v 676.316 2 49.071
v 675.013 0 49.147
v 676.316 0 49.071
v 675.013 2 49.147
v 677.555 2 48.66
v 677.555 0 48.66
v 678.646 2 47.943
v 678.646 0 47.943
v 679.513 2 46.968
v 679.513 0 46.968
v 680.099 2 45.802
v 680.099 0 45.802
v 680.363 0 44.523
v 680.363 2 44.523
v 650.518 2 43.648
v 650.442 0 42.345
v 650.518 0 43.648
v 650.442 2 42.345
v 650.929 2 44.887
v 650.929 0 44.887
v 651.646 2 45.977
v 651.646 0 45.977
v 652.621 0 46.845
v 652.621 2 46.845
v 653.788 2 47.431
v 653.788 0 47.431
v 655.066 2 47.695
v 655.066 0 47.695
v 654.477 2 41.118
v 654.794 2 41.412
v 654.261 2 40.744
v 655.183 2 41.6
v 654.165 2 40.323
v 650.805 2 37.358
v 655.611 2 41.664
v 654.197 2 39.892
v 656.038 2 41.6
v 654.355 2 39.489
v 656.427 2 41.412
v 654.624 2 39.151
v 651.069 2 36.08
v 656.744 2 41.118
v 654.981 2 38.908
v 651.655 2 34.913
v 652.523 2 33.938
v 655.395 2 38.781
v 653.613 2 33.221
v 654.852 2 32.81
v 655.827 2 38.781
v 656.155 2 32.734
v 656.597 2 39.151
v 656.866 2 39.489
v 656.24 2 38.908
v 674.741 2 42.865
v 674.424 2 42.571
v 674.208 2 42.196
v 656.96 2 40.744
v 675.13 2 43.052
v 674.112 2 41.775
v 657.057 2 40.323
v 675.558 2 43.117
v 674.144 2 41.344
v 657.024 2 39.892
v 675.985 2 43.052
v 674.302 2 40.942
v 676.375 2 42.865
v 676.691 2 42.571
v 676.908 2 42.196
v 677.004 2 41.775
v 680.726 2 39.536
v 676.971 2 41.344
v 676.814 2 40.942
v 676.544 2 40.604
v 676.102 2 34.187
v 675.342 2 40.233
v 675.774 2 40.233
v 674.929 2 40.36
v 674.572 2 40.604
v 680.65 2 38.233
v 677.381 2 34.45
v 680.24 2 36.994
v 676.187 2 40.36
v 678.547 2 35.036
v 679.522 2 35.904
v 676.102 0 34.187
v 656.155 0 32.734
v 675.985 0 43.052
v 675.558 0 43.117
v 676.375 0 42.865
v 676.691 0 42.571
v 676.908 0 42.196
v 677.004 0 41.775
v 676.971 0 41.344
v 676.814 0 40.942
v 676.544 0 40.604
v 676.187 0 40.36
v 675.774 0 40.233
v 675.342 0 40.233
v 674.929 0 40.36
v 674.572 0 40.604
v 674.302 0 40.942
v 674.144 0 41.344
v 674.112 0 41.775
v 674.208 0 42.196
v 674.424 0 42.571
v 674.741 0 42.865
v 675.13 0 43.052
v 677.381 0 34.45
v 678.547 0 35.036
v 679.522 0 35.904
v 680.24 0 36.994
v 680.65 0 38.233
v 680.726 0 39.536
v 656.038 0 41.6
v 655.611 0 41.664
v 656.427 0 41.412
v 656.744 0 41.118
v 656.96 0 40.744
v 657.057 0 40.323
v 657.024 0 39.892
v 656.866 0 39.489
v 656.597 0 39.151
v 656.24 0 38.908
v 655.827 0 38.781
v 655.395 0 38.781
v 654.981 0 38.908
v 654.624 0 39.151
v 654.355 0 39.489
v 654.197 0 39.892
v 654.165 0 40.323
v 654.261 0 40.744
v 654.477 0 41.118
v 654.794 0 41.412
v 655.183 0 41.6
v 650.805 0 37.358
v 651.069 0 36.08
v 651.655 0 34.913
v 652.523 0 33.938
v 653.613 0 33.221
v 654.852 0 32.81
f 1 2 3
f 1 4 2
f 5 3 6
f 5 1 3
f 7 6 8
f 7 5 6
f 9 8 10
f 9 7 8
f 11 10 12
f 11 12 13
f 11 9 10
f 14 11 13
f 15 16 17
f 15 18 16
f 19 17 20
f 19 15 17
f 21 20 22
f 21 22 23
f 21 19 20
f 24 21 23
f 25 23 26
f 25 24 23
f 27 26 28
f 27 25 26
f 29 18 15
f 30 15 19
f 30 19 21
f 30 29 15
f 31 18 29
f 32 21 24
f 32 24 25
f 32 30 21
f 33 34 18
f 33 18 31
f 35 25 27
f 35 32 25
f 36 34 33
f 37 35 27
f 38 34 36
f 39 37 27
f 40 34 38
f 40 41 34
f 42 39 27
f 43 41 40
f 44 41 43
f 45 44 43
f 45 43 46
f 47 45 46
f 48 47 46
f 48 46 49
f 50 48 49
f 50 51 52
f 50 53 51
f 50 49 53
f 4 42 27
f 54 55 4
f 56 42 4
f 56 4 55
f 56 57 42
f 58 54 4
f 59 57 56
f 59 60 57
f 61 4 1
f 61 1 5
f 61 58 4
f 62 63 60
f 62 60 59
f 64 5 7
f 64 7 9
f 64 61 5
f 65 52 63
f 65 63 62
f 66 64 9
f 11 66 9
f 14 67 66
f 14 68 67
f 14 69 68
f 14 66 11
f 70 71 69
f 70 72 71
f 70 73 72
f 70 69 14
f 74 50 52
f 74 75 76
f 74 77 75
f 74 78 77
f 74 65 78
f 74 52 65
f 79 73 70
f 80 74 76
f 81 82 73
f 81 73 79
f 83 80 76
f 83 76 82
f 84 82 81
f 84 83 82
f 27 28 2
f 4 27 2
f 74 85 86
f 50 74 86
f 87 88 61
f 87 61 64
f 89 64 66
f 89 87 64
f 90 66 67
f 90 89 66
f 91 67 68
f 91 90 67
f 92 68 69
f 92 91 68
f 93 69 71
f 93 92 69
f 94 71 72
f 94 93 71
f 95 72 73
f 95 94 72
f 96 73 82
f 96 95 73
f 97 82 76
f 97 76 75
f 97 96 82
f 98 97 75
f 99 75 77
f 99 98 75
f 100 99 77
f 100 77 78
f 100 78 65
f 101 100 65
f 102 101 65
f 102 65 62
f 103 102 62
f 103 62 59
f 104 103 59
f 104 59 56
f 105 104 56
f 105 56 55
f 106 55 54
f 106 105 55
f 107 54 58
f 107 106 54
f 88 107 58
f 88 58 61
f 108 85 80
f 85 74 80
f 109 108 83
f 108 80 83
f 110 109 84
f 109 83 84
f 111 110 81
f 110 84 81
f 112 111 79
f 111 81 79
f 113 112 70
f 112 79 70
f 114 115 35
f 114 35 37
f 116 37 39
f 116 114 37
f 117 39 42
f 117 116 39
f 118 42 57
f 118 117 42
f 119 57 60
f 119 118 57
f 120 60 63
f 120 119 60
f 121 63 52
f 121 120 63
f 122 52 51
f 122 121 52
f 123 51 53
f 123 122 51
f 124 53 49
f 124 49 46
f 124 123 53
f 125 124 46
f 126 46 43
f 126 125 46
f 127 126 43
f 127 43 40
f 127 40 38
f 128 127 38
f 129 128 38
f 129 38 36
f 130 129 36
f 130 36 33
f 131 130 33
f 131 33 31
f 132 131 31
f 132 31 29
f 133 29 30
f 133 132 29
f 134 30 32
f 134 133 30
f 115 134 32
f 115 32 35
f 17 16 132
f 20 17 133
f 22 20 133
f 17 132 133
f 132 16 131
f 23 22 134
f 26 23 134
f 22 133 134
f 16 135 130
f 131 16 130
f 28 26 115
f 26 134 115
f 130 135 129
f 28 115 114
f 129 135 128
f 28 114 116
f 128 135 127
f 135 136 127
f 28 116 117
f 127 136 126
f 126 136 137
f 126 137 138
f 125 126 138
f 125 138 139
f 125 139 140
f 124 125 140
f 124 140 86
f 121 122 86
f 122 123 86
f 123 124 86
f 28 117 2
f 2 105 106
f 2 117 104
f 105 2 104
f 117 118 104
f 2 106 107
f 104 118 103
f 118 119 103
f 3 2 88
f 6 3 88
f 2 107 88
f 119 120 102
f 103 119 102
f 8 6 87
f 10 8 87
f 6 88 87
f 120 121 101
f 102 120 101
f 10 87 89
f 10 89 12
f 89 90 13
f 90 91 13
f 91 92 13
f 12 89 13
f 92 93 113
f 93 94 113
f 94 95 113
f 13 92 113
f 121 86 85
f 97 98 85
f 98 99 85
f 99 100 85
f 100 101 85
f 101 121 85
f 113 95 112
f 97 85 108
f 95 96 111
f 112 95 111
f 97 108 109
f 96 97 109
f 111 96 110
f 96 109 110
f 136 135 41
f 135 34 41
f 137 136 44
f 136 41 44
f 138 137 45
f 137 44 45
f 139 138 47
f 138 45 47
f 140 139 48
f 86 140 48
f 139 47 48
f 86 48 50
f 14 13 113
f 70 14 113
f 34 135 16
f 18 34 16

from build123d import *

# Parameters (mm, degrees)
SKETCH_1_R      = 1.45
EXTRUDE_1_DEPTH = 2
FILLET_1_R      = 5


with BuildPart() as part:
    # 草图1 → 凸台-拉伸1 (new body)
    with BuildSketch(Plane(origin=(0, 0, 0), x_dir=(1, 0, 0), z_dir=(0, 1, 0))):
        Polygon((651.168451136, -32.371101997), (650.079202112, -47.331500941), (680, -49.50999899), (681.089249024, -34.549600046), align=None)
        with Locations(Location((655.610626272, -40.214384477, 0), (0, 0, 270))):
            Circle(SKETCH_1_R, mode=Mode.SUBTRACT)
        with Locations(Location((675.557824864, -41.66671651, 0), (0, 0, 270))):
            Circle(SKETCH_1_R, mode=Mode.SUBTRACT)
    extrude(amount=EXTRUDE_1_DEPTH)

    # 圆角1
    fillet_1_edges = [part.edges().sort_by_distance(p)[0] for p in [
        (680, 1, 49.50999899),
        (650.079202112, 1, 47.331500941),
        (651.168451136, 1, 32.371101997),
        (681.089249024, 1, 34.549600046),
    ]]
    fillet(fillet_1_edges, radius=FILLET_1_R)


solid = part.part
